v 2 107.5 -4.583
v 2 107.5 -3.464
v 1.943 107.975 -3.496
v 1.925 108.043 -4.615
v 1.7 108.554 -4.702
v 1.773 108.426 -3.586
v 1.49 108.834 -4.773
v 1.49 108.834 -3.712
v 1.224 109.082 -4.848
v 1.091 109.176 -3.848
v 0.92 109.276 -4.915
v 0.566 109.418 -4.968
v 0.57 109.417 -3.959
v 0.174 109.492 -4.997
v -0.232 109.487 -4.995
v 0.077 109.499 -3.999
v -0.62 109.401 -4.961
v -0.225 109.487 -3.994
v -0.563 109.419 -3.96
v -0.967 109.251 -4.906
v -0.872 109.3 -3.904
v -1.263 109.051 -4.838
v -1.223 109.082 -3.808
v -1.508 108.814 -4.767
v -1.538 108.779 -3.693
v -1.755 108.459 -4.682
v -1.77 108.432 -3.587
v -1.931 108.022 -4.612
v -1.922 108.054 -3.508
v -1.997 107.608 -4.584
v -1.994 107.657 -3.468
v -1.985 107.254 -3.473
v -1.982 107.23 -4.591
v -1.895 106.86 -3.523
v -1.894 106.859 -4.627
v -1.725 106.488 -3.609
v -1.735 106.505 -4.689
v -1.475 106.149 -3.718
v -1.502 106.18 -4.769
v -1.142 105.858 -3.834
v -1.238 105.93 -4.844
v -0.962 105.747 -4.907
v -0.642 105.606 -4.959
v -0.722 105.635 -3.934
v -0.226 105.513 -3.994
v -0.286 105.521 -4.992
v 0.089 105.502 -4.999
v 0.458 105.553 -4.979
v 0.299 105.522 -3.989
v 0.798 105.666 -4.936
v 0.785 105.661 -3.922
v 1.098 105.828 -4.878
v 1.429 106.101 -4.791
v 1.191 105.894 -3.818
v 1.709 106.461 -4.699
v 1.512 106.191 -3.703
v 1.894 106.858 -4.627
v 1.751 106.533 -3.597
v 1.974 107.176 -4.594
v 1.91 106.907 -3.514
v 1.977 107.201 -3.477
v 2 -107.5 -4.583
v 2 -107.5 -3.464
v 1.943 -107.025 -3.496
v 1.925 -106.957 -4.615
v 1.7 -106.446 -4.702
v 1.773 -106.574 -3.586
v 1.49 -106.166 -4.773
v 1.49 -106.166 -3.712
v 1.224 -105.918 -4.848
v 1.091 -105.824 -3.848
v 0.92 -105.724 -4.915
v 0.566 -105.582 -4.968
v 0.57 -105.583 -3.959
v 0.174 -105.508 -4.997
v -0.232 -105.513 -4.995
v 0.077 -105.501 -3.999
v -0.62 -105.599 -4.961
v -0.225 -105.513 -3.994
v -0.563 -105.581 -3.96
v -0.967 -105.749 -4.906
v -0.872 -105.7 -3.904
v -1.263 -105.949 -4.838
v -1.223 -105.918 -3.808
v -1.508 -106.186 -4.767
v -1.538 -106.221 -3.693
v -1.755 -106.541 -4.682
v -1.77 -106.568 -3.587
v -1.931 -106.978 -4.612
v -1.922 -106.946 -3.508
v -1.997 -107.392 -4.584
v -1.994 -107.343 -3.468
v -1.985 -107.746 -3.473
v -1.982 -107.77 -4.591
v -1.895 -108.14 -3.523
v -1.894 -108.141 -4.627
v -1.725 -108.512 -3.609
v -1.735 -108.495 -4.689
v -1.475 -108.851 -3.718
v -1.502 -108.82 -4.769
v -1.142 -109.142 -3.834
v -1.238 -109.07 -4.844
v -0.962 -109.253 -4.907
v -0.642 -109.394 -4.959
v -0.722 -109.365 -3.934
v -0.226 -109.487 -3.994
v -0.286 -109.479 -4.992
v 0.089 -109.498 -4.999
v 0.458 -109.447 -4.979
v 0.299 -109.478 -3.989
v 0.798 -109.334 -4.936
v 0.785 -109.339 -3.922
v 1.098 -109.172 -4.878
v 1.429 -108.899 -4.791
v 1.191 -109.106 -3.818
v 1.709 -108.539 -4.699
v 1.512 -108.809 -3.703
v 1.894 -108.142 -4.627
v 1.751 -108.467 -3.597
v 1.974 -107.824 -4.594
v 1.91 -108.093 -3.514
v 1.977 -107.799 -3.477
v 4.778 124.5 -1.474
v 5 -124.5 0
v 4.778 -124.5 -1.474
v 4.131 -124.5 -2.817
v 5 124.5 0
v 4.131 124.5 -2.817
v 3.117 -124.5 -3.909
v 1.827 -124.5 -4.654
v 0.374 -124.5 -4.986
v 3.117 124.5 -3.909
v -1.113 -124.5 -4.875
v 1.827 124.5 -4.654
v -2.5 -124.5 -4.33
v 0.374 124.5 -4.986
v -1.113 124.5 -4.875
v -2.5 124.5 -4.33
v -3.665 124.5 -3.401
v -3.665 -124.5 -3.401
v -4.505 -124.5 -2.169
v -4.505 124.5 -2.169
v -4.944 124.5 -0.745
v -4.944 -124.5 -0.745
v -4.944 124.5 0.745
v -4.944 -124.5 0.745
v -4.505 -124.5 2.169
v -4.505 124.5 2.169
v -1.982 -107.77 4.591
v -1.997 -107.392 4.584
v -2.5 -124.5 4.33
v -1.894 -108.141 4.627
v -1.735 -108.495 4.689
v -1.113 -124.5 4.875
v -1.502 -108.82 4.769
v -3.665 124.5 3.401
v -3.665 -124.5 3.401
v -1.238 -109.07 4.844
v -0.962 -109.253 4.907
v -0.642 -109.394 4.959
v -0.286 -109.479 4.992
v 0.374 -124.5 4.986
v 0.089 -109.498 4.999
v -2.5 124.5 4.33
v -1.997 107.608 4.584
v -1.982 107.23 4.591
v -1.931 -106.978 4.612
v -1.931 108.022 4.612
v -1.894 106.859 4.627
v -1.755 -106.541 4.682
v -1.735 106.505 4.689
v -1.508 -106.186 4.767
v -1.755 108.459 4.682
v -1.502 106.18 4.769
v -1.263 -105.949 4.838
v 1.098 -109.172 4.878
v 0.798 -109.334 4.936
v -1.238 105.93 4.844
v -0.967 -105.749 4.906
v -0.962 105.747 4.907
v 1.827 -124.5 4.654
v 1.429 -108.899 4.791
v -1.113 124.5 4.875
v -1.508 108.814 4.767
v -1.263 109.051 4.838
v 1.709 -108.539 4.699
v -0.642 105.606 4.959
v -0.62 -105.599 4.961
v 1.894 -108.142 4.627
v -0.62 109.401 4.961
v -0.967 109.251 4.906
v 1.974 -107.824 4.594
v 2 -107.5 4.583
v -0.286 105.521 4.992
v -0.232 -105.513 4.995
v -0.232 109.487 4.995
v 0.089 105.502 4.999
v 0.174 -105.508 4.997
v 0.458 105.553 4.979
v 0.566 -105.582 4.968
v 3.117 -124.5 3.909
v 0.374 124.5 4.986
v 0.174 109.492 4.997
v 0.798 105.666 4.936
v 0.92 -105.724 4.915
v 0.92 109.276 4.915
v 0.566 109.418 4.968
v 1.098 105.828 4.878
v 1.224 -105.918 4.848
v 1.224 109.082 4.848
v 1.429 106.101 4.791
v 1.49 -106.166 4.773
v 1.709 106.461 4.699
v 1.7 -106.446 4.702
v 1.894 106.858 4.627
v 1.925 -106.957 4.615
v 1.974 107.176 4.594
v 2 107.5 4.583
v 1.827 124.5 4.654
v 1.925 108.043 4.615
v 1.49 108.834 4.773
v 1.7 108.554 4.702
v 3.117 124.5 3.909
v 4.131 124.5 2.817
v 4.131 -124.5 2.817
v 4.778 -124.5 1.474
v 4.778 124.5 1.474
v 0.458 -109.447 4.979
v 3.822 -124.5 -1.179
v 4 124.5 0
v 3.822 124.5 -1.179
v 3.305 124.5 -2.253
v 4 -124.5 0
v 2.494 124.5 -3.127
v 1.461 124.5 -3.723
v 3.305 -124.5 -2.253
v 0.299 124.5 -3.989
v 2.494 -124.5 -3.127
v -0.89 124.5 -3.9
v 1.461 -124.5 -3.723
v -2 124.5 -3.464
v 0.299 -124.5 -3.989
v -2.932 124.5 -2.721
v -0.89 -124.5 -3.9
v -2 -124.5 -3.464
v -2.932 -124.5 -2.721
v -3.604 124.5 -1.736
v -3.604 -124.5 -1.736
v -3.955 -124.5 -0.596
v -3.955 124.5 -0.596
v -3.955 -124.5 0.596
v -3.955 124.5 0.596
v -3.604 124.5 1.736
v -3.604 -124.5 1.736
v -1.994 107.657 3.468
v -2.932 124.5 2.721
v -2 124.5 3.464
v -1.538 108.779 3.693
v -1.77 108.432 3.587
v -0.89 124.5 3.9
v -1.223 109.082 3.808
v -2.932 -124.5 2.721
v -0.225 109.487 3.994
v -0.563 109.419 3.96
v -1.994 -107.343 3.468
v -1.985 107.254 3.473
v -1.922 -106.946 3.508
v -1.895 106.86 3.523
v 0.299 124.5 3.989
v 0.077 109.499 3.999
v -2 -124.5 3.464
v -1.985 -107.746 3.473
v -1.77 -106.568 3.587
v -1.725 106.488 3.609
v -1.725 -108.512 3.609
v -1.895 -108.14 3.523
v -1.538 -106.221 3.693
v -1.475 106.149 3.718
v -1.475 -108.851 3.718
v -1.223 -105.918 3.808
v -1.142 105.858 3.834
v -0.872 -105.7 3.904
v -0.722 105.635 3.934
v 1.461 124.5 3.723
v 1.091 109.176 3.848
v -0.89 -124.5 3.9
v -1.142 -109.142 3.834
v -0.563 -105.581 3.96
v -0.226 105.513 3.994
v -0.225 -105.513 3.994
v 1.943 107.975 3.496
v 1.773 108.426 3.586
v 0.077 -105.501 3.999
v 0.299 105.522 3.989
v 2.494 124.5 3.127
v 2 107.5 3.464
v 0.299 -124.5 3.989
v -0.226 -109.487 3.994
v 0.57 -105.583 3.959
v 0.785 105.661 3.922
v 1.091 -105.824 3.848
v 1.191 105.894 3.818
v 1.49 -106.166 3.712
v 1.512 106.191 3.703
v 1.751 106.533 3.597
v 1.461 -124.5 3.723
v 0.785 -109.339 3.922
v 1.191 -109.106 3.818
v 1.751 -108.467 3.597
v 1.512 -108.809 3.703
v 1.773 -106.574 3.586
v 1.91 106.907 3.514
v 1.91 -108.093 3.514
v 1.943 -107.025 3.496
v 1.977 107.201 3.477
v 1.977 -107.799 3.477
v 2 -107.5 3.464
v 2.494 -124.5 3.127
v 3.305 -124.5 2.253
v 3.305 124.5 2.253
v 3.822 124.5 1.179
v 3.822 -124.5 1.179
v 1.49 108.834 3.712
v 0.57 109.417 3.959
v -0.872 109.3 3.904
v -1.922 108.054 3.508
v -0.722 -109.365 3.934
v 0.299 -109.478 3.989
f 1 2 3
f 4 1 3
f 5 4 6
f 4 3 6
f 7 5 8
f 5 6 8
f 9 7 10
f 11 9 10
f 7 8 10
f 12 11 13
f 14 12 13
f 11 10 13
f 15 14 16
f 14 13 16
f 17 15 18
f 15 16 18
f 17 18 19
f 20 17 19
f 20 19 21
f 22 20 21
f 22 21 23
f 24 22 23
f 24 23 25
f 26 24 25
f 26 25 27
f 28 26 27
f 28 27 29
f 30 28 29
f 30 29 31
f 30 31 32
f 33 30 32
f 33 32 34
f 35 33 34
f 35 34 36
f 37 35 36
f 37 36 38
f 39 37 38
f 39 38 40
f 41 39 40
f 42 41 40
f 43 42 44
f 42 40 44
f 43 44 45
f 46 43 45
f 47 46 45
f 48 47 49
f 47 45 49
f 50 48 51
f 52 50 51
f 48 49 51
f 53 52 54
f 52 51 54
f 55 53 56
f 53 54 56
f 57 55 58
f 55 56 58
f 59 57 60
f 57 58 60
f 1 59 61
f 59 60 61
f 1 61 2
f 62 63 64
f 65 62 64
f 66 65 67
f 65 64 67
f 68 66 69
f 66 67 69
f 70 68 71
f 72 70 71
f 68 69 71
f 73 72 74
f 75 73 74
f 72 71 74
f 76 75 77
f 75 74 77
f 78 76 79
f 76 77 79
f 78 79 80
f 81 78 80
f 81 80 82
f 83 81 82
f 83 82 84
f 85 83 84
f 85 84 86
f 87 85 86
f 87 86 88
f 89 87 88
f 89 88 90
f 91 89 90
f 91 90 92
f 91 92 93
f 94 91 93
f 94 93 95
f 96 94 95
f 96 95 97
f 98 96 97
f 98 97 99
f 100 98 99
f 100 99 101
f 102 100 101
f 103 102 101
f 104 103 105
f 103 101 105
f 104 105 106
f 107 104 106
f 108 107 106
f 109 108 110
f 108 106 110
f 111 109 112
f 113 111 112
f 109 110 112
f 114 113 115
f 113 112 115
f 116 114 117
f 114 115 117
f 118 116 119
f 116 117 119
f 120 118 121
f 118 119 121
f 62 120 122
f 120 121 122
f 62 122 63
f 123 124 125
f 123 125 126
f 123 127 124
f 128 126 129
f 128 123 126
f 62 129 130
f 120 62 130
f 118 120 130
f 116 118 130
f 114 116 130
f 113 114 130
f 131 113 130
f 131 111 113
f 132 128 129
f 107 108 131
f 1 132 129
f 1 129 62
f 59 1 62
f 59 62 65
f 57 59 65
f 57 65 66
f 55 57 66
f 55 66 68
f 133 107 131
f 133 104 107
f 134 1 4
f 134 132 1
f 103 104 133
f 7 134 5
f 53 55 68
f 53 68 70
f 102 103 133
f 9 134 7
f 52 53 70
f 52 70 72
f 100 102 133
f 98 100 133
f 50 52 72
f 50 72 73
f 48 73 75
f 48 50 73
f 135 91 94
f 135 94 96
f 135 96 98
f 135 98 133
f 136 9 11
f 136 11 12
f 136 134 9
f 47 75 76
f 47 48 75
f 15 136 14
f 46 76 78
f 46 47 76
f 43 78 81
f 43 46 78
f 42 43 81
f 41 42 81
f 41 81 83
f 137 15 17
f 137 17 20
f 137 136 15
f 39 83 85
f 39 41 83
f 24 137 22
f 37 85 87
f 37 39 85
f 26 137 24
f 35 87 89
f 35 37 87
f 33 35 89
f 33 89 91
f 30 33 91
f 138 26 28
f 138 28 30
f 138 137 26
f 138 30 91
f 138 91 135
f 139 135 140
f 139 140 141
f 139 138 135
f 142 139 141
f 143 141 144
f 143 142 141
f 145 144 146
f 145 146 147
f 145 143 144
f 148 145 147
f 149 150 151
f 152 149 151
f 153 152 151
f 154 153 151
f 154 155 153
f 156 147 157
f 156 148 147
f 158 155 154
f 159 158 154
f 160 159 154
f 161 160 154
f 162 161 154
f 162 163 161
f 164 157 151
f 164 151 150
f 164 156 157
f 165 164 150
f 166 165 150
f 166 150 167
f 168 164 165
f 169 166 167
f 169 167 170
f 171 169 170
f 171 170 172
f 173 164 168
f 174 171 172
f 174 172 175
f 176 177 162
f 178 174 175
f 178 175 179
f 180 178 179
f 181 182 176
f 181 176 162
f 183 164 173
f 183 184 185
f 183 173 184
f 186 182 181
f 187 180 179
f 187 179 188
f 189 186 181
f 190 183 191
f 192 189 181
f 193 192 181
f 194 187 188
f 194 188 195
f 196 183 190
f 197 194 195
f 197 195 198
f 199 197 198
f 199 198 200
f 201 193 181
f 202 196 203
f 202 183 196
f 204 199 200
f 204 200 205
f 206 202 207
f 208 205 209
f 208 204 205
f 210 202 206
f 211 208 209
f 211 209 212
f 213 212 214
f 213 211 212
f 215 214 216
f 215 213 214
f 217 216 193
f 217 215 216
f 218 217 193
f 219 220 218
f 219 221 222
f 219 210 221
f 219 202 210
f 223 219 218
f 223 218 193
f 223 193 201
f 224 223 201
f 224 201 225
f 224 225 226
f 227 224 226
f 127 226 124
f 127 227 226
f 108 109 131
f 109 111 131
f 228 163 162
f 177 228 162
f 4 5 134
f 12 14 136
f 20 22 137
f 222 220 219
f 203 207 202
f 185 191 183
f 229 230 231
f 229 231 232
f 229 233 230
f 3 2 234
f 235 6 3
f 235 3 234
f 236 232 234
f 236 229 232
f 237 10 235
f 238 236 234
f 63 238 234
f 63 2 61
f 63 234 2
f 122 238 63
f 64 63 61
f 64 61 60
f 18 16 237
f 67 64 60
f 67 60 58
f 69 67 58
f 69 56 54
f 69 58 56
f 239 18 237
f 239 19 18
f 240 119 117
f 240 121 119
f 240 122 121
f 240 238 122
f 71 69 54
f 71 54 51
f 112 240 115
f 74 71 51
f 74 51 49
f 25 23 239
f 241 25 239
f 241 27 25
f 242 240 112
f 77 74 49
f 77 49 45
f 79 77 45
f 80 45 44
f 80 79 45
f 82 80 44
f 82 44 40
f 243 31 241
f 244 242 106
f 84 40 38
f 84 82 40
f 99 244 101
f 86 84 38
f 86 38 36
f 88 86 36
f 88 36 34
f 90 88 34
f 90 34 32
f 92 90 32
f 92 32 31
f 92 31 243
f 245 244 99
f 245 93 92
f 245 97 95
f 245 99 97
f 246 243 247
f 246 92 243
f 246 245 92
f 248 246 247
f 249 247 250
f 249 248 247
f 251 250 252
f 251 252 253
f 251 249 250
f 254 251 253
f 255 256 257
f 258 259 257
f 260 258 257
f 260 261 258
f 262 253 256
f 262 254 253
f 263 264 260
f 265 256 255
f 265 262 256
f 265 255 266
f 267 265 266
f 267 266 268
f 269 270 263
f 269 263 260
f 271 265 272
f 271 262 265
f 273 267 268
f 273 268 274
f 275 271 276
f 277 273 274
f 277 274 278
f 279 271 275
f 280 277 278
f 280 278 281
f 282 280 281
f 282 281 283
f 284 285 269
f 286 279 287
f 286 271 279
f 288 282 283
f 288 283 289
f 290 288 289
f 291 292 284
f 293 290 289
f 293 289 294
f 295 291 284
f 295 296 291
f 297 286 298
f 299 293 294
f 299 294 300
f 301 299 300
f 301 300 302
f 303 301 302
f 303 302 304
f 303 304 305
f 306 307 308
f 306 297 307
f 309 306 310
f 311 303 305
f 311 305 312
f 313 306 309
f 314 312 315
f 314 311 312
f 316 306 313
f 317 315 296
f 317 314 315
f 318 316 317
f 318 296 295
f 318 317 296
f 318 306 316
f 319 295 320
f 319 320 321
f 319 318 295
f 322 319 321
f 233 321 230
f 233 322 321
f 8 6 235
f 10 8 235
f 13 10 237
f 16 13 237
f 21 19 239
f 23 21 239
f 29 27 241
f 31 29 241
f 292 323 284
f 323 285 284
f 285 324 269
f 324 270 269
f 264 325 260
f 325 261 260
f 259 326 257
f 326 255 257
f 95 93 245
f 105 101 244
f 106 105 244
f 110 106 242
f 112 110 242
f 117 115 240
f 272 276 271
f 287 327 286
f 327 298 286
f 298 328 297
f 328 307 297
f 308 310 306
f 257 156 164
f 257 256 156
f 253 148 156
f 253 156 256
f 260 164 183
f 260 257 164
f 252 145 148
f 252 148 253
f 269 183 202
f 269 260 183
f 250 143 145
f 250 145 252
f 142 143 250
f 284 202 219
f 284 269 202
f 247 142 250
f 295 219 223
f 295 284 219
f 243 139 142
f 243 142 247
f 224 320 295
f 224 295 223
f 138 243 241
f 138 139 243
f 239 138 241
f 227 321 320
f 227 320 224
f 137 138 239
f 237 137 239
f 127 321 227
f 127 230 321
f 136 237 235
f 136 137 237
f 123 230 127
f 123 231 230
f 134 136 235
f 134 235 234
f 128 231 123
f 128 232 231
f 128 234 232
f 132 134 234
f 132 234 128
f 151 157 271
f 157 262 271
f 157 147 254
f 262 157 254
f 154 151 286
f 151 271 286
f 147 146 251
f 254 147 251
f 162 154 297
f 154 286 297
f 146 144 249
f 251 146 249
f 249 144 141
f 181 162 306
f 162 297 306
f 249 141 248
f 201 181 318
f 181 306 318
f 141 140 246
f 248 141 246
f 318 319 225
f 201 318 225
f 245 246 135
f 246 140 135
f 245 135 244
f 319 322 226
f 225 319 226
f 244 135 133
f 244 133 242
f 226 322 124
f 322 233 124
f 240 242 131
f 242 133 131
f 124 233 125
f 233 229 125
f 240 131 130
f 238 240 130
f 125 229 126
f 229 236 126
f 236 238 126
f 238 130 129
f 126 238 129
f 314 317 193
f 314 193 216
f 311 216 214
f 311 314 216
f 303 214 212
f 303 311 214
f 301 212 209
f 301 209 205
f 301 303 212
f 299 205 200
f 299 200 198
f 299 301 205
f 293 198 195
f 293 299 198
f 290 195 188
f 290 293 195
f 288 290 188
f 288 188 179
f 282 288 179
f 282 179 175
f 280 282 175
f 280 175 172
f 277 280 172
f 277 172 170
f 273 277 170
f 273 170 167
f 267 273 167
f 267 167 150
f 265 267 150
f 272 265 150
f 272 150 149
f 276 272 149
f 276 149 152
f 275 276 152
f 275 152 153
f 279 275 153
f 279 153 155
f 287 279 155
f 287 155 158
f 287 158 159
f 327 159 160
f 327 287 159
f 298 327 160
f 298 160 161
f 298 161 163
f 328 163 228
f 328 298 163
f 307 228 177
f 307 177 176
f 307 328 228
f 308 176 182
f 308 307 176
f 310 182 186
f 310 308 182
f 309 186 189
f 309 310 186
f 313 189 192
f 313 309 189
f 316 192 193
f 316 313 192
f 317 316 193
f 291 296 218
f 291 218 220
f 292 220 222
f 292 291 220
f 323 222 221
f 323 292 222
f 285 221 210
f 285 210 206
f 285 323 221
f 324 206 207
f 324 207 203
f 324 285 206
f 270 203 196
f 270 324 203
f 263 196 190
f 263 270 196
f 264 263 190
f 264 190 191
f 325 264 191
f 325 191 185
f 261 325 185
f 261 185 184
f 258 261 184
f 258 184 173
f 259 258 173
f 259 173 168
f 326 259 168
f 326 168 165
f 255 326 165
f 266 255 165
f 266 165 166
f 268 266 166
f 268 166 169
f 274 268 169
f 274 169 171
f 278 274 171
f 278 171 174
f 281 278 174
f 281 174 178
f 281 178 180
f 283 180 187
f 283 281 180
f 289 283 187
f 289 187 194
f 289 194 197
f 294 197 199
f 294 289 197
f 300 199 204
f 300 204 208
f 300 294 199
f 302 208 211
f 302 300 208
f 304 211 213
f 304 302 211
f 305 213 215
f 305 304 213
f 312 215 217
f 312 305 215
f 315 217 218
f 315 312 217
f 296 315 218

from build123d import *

# Parameters (mm, degrees)
SKETCH_1_R               = 5
SKETCH_1_R_2             = 4
EXTRUDE_1_DEPTH          = 124.5
SKETCH_2_R               = 2
CUT_EXTRUDE_1_DEPTH      = 6
CUT_EXTRUDE_1_DEPTH_BACK = 6


with BuildPart() as part:
    # 草图1 → 拉伸-薄壁1 (new body, symmetric)
    with BuildSketch(Plane(origin=(0, 0, 0), x_dir=(1, 0, 0), z_dir=(0, 1, 0))):
        Circle(SKETCH_1_R)
        Circle(SKETCH_1_R_2, mode=Mode.SUBTRACT)
    extrude(amount=EXTRUDE_1_DEPTH, both=True)

    # 草图2 → 切除-拉伸1 (cut, two sides)
    with BuildSketch(Plane.XY) as cut_extrude_1_sk:
        with Locations((0, -107.5)):
            Circle(SKETCH_2_R)
        with Locations((0, 107.5)):
            Circle(SKETCH_2_R)
    extrude(amount=CUT_EXTRUDE_1_DEPTH, mode=Mode.SUBTRACT)
    extrude(cut_extrude_1_sk.sketch, amount=-CUT_EXTRUDE_1_DEPTH_BACK, mode=Mode.SUBTRACT)


solid = part.part
